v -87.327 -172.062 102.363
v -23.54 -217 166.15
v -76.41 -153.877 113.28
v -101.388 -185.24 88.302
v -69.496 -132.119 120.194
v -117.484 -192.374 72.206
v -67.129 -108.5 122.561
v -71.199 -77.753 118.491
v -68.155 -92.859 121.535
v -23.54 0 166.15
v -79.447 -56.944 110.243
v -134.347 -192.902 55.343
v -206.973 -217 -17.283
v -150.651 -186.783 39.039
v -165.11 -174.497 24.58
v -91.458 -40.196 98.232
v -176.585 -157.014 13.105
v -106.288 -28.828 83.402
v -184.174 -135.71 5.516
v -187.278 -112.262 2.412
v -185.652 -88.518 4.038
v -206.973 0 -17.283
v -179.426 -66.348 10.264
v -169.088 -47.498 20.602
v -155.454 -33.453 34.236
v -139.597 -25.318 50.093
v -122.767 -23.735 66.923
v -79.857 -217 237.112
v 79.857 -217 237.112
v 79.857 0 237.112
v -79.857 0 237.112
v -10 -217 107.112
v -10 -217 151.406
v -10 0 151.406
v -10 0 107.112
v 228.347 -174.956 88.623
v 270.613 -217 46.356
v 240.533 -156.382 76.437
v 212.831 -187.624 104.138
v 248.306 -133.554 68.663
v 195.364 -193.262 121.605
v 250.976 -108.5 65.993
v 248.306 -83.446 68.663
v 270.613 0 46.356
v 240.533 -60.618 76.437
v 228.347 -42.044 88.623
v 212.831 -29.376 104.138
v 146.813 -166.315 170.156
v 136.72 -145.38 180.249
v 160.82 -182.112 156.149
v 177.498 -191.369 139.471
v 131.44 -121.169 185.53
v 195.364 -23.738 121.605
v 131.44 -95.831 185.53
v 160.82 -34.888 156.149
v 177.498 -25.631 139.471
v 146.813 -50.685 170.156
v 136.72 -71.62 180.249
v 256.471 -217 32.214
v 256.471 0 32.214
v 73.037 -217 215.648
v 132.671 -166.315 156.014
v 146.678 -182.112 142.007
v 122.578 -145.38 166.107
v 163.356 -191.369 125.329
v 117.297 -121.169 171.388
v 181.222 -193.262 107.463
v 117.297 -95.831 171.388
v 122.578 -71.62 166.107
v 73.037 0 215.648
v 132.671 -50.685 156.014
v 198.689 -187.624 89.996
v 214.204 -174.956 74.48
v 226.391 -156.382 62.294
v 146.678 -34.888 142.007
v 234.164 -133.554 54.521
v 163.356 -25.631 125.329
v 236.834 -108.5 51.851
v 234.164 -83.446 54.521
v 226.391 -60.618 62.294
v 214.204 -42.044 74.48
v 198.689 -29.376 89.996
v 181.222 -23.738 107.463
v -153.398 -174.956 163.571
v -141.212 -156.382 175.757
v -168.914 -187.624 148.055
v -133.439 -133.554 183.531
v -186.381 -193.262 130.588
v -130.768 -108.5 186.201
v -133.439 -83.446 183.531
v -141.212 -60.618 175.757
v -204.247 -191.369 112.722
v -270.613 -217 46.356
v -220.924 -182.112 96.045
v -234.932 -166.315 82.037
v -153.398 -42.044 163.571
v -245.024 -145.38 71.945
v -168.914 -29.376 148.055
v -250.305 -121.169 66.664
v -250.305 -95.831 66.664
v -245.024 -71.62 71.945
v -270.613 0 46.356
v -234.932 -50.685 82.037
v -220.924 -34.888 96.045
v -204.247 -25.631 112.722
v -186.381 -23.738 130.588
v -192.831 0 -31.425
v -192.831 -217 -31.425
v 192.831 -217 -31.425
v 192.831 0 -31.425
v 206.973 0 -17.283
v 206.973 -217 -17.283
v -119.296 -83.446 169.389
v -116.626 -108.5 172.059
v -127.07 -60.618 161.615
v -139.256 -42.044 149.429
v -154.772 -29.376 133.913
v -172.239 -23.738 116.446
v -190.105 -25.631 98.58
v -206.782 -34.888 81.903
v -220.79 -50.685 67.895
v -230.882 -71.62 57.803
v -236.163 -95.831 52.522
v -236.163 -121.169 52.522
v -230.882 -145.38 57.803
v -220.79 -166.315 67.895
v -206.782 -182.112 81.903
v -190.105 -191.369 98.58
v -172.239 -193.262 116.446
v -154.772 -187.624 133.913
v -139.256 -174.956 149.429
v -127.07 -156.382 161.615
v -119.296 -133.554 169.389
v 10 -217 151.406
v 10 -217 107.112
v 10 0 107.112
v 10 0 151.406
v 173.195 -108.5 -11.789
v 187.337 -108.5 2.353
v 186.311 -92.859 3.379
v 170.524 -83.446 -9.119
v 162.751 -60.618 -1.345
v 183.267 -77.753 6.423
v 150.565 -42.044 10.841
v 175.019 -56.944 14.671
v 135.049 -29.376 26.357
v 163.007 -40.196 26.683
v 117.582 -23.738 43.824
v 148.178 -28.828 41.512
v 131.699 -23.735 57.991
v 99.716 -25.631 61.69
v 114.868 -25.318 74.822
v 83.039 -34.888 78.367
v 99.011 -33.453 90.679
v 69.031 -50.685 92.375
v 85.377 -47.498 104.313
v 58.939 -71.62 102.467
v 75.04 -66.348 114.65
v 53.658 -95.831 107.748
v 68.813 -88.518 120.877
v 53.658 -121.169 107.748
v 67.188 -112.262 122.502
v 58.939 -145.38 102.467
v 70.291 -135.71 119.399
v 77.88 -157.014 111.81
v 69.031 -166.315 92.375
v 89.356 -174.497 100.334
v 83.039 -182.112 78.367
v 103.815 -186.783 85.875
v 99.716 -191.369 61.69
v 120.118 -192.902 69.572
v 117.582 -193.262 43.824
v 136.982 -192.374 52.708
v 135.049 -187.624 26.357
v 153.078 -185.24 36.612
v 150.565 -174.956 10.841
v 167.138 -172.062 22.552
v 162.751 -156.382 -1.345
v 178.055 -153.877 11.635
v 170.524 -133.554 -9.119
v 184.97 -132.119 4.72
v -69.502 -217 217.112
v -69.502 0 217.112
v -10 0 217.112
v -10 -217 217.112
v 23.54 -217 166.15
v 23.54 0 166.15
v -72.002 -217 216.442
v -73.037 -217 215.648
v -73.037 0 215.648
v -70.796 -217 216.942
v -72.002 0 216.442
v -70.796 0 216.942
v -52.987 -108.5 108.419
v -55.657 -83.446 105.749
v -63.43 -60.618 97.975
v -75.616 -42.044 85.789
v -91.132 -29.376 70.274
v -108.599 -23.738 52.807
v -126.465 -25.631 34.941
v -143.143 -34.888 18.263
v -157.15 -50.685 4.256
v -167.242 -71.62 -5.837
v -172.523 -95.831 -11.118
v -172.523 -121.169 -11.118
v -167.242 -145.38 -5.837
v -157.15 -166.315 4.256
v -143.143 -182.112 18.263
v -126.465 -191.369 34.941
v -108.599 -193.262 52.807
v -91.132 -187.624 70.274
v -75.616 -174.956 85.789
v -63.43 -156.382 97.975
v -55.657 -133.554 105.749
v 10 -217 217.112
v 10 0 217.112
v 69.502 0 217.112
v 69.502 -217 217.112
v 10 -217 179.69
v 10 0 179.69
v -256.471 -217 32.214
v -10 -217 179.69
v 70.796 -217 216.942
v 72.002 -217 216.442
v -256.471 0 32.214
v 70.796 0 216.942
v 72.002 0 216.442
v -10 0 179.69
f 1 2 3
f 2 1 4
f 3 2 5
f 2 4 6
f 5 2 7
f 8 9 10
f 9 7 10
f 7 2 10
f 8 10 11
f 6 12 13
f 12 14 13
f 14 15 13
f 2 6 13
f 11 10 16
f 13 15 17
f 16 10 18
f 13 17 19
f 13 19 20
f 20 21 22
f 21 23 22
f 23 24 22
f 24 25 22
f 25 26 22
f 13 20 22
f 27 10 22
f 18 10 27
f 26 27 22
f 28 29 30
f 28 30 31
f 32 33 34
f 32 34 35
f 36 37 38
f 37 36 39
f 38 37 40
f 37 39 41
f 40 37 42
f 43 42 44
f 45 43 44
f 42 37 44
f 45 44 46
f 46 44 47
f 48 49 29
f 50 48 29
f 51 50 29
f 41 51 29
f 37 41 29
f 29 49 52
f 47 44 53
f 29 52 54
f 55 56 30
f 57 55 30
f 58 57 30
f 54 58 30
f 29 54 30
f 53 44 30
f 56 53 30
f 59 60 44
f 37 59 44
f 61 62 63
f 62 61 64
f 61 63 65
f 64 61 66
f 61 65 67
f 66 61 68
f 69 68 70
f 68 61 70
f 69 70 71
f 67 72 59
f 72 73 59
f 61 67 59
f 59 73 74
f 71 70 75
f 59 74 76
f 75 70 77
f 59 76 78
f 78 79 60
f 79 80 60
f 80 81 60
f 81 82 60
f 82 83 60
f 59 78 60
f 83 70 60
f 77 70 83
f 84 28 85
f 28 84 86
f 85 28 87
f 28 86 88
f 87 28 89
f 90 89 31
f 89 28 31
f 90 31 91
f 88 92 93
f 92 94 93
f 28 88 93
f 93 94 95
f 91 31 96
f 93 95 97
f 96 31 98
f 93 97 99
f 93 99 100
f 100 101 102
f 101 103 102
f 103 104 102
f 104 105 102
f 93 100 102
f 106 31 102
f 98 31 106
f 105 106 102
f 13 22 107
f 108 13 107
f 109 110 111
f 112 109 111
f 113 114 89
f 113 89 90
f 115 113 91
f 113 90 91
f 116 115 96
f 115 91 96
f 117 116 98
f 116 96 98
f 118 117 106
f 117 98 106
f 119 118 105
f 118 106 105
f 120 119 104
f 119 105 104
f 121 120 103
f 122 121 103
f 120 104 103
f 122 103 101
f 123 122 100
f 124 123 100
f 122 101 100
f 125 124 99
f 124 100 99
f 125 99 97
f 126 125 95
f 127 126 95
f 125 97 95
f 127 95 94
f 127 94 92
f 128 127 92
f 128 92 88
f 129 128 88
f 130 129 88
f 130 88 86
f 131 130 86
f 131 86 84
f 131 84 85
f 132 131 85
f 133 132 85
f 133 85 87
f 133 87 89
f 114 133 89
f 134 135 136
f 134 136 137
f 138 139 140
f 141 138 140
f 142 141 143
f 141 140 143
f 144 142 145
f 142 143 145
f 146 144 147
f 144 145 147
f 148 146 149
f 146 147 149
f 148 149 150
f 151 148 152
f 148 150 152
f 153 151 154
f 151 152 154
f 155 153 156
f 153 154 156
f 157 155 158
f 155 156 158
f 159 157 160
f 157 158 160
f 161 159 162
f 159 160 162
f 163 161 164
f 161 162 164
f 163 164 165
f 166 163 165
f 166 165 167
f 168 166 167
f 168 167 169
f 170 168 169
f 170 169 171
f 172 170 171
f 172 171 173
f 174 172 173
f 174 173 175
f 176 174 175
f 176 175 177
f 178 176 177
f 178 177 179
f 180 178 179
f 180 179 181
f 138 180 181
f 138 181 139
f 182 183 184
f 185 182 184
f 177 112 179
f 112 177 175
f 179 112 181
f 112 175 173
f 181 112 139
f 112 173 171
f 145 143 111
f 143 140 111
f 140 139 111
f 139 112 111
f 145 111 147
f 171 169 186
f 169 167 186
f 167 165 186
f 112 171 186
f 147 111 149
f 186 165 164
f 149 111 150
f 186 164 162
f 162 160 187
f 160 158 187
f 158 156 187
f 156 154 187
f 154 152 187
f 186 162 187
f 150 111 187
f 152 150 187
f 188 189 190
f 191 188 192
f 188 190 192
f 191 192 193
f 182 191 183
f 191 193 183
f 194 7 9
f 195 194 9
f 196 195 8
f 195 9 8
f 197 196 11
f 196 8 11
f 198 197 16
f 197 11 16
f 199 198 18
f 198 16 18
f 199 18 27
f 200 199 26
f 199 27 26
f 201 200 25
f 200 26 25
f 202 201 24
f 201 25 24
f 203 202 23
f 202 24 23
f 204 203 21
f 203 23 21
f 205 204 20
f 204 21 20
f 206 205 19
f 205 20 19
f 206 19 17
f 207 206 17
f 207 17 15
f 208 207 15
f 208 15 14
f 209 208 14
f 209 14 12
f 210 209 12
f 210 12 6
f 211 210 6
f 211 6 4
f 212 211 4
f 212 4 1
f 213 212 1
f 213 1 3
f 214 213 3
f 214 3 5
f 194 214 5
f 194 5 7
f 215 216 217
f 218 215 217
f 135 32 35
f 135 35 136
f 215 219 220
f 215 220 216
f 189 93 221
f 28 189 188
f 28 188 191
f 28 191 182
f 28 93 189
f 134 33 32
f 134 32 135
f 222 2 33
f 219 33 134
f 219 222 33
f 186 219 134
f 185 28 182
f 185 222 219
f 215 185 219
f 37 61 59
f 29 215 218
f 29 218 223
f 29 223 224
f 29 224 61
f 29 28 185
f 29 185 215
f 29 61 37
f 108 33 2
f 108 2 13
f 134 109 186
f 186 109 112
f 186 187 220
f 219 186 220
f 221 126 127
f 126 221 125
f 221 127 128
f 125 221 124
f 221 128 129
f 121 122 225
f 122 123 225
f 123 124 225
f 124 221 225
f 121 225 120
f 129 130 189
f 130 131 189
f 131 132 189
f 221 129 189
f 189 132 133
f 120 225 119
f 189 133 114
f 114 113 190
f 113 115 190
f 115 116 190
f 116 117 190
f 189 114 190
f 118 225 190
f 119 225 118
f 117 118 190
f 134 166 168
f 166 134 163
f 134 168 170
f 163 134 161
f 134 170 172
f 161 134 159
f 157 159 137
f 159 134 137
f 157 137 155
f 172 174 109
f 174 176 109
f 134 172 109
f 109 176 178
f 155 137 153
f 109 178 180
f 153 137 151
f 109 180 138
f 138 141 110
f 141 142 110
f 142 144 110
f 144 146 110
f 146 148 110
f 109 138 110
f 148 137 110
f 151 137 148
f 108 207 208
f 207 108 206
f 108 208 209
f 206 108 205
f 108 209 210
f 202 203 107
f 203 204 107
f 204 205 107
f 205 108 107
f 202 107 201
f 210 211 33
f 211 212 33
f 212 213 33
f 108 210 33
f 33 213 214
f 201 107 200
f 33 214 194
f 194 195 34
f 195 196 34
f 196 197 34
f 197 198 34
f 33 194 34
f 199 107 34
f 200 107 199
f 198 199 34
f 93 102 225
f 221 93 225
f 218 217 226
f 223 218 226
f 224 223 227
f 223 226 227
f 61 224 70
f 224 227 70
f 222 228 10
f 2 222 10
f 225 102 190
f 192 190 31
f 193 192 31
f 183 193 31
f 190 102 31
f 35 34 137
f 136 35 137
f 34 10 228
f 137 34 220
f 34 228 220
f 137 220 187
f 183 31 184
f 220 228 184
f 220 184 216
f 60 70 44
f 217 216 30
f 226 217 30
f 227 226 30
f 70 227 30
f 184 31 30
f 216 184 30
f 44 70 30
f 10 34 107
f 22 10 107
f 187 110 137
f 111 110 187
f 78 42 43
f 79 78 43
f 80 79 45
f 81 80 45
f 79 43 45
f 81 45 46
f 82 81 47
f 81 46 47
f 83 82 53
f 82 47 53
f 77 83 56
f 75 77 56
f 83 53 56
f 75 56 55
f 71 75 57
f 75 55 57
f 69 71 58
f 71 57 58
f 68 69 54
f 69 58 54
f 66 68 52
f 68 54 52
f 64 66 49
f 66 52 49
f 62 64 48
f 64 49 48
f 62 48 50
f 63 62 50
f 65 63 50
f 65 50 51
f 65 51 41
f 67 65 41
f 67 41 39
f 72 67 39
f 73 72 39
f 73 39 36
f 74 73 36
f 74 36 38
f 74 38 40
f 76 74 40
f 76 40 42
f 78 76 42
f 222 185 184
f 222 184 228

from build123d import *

# Parameters (mm, degrees)
F1_DEPTH = 217
F2_R     = 85
F3_DEPTH = 120
F4_R     = 85
F5_DEPTH = 120


with BuildPart() as f1:
    # F0 (on Front) → F1 (new body)
    with BuildSketch(Plane.XZ):
        with BuildLine():
            Line((-79.857185, 237.112019), (-270.612759, 46.356446))
            Line((-270.612759, 46.356446), (-256.470623, 32.21431))
            Line((-256.470623, 32.21431), (-73.03738, 215.647553))
            ThreePointArc((-73.03738, 215.647553), (-71.415263, 216.731417), (-69.501846, 217.112019))
            Line((-69.501846, 217.112019), (-10, 217.112019))
            Line((-10, 217.112019), (-10, 179.689983))
            Line((-10, 179.689983), (-23.539905, 166.150078))
            Line((-23.539905, 166.150078), (-206.973149, -17.283164))
            Line((-206.973149, -17.283164), (-192.831013, -31.4253))
            Line((-192.831013, -31.4253), (-10, 151.405712))
            Line((-10, 151.405712), (-10, 107.112019))
            Line((-10, 107.112019), (0, 107.112019))
            Line((0, 107.112019), (10, 107.112019))
            Line((10, 107.112019), (10, 151.405712))
            Line((10, 151.405712), (192.831013, -31.4253))
            Line((192.831013, -31.4253), (206.973149, -17.283164))
            Line((206.973149, -17.283164), (23.539905, 166.150078))
            Line((23.539905, 166.150078), (10, 179.689983))
            Line((10, 179.689983), (10, 217.112019))
            Line((10, 217.112019), (69.501846, 217.112019))
            ThreePointArc((69.501846, 217.112019), (71.415263, 216.731417), (73.03738, 215.647553))
            Line((73.03738, 215.647553), (256.470622, 32.21431))
            Line((256.470622, 32.21431), (270.612758, 46.356446))
            Line((270.612758, 46.356446), (79.857185, 237.112019))
            Line((79.857185, 237.112019), (-79.857185, 237.112019))
        make_face()
    extrude(amount=F1_DEPTH)

    # F2 (on face) → F3 (cut)
    with BuildSketch(Plane(origin=(-158.484602, 0, 158.484603), x_dir=(0.707107, 0, 0.707107), z_dir=(-0.707107, 0, 0.707107))):
        with Locations((-45.80316, -108.5)):
            Circle(F2_R)
    extrude(amount=-F3_DEPTH, mode=Mode.SUBTRACT)

    # F4 (on face) → F5 (cut)
    with BuildSketch(Plane(origin=(158.484602, 0, 158.484602), x_dir=(0.707107, 0, -0.707107), z_dir=(0.707107, 0, 0.707107))):
        with Locations((45.803159, -108.5)):
            Circle(F4_R)
    extrude(amount=-F5_DEPTH, mode=Mode.SUBTRACT)


solid = f1.part
